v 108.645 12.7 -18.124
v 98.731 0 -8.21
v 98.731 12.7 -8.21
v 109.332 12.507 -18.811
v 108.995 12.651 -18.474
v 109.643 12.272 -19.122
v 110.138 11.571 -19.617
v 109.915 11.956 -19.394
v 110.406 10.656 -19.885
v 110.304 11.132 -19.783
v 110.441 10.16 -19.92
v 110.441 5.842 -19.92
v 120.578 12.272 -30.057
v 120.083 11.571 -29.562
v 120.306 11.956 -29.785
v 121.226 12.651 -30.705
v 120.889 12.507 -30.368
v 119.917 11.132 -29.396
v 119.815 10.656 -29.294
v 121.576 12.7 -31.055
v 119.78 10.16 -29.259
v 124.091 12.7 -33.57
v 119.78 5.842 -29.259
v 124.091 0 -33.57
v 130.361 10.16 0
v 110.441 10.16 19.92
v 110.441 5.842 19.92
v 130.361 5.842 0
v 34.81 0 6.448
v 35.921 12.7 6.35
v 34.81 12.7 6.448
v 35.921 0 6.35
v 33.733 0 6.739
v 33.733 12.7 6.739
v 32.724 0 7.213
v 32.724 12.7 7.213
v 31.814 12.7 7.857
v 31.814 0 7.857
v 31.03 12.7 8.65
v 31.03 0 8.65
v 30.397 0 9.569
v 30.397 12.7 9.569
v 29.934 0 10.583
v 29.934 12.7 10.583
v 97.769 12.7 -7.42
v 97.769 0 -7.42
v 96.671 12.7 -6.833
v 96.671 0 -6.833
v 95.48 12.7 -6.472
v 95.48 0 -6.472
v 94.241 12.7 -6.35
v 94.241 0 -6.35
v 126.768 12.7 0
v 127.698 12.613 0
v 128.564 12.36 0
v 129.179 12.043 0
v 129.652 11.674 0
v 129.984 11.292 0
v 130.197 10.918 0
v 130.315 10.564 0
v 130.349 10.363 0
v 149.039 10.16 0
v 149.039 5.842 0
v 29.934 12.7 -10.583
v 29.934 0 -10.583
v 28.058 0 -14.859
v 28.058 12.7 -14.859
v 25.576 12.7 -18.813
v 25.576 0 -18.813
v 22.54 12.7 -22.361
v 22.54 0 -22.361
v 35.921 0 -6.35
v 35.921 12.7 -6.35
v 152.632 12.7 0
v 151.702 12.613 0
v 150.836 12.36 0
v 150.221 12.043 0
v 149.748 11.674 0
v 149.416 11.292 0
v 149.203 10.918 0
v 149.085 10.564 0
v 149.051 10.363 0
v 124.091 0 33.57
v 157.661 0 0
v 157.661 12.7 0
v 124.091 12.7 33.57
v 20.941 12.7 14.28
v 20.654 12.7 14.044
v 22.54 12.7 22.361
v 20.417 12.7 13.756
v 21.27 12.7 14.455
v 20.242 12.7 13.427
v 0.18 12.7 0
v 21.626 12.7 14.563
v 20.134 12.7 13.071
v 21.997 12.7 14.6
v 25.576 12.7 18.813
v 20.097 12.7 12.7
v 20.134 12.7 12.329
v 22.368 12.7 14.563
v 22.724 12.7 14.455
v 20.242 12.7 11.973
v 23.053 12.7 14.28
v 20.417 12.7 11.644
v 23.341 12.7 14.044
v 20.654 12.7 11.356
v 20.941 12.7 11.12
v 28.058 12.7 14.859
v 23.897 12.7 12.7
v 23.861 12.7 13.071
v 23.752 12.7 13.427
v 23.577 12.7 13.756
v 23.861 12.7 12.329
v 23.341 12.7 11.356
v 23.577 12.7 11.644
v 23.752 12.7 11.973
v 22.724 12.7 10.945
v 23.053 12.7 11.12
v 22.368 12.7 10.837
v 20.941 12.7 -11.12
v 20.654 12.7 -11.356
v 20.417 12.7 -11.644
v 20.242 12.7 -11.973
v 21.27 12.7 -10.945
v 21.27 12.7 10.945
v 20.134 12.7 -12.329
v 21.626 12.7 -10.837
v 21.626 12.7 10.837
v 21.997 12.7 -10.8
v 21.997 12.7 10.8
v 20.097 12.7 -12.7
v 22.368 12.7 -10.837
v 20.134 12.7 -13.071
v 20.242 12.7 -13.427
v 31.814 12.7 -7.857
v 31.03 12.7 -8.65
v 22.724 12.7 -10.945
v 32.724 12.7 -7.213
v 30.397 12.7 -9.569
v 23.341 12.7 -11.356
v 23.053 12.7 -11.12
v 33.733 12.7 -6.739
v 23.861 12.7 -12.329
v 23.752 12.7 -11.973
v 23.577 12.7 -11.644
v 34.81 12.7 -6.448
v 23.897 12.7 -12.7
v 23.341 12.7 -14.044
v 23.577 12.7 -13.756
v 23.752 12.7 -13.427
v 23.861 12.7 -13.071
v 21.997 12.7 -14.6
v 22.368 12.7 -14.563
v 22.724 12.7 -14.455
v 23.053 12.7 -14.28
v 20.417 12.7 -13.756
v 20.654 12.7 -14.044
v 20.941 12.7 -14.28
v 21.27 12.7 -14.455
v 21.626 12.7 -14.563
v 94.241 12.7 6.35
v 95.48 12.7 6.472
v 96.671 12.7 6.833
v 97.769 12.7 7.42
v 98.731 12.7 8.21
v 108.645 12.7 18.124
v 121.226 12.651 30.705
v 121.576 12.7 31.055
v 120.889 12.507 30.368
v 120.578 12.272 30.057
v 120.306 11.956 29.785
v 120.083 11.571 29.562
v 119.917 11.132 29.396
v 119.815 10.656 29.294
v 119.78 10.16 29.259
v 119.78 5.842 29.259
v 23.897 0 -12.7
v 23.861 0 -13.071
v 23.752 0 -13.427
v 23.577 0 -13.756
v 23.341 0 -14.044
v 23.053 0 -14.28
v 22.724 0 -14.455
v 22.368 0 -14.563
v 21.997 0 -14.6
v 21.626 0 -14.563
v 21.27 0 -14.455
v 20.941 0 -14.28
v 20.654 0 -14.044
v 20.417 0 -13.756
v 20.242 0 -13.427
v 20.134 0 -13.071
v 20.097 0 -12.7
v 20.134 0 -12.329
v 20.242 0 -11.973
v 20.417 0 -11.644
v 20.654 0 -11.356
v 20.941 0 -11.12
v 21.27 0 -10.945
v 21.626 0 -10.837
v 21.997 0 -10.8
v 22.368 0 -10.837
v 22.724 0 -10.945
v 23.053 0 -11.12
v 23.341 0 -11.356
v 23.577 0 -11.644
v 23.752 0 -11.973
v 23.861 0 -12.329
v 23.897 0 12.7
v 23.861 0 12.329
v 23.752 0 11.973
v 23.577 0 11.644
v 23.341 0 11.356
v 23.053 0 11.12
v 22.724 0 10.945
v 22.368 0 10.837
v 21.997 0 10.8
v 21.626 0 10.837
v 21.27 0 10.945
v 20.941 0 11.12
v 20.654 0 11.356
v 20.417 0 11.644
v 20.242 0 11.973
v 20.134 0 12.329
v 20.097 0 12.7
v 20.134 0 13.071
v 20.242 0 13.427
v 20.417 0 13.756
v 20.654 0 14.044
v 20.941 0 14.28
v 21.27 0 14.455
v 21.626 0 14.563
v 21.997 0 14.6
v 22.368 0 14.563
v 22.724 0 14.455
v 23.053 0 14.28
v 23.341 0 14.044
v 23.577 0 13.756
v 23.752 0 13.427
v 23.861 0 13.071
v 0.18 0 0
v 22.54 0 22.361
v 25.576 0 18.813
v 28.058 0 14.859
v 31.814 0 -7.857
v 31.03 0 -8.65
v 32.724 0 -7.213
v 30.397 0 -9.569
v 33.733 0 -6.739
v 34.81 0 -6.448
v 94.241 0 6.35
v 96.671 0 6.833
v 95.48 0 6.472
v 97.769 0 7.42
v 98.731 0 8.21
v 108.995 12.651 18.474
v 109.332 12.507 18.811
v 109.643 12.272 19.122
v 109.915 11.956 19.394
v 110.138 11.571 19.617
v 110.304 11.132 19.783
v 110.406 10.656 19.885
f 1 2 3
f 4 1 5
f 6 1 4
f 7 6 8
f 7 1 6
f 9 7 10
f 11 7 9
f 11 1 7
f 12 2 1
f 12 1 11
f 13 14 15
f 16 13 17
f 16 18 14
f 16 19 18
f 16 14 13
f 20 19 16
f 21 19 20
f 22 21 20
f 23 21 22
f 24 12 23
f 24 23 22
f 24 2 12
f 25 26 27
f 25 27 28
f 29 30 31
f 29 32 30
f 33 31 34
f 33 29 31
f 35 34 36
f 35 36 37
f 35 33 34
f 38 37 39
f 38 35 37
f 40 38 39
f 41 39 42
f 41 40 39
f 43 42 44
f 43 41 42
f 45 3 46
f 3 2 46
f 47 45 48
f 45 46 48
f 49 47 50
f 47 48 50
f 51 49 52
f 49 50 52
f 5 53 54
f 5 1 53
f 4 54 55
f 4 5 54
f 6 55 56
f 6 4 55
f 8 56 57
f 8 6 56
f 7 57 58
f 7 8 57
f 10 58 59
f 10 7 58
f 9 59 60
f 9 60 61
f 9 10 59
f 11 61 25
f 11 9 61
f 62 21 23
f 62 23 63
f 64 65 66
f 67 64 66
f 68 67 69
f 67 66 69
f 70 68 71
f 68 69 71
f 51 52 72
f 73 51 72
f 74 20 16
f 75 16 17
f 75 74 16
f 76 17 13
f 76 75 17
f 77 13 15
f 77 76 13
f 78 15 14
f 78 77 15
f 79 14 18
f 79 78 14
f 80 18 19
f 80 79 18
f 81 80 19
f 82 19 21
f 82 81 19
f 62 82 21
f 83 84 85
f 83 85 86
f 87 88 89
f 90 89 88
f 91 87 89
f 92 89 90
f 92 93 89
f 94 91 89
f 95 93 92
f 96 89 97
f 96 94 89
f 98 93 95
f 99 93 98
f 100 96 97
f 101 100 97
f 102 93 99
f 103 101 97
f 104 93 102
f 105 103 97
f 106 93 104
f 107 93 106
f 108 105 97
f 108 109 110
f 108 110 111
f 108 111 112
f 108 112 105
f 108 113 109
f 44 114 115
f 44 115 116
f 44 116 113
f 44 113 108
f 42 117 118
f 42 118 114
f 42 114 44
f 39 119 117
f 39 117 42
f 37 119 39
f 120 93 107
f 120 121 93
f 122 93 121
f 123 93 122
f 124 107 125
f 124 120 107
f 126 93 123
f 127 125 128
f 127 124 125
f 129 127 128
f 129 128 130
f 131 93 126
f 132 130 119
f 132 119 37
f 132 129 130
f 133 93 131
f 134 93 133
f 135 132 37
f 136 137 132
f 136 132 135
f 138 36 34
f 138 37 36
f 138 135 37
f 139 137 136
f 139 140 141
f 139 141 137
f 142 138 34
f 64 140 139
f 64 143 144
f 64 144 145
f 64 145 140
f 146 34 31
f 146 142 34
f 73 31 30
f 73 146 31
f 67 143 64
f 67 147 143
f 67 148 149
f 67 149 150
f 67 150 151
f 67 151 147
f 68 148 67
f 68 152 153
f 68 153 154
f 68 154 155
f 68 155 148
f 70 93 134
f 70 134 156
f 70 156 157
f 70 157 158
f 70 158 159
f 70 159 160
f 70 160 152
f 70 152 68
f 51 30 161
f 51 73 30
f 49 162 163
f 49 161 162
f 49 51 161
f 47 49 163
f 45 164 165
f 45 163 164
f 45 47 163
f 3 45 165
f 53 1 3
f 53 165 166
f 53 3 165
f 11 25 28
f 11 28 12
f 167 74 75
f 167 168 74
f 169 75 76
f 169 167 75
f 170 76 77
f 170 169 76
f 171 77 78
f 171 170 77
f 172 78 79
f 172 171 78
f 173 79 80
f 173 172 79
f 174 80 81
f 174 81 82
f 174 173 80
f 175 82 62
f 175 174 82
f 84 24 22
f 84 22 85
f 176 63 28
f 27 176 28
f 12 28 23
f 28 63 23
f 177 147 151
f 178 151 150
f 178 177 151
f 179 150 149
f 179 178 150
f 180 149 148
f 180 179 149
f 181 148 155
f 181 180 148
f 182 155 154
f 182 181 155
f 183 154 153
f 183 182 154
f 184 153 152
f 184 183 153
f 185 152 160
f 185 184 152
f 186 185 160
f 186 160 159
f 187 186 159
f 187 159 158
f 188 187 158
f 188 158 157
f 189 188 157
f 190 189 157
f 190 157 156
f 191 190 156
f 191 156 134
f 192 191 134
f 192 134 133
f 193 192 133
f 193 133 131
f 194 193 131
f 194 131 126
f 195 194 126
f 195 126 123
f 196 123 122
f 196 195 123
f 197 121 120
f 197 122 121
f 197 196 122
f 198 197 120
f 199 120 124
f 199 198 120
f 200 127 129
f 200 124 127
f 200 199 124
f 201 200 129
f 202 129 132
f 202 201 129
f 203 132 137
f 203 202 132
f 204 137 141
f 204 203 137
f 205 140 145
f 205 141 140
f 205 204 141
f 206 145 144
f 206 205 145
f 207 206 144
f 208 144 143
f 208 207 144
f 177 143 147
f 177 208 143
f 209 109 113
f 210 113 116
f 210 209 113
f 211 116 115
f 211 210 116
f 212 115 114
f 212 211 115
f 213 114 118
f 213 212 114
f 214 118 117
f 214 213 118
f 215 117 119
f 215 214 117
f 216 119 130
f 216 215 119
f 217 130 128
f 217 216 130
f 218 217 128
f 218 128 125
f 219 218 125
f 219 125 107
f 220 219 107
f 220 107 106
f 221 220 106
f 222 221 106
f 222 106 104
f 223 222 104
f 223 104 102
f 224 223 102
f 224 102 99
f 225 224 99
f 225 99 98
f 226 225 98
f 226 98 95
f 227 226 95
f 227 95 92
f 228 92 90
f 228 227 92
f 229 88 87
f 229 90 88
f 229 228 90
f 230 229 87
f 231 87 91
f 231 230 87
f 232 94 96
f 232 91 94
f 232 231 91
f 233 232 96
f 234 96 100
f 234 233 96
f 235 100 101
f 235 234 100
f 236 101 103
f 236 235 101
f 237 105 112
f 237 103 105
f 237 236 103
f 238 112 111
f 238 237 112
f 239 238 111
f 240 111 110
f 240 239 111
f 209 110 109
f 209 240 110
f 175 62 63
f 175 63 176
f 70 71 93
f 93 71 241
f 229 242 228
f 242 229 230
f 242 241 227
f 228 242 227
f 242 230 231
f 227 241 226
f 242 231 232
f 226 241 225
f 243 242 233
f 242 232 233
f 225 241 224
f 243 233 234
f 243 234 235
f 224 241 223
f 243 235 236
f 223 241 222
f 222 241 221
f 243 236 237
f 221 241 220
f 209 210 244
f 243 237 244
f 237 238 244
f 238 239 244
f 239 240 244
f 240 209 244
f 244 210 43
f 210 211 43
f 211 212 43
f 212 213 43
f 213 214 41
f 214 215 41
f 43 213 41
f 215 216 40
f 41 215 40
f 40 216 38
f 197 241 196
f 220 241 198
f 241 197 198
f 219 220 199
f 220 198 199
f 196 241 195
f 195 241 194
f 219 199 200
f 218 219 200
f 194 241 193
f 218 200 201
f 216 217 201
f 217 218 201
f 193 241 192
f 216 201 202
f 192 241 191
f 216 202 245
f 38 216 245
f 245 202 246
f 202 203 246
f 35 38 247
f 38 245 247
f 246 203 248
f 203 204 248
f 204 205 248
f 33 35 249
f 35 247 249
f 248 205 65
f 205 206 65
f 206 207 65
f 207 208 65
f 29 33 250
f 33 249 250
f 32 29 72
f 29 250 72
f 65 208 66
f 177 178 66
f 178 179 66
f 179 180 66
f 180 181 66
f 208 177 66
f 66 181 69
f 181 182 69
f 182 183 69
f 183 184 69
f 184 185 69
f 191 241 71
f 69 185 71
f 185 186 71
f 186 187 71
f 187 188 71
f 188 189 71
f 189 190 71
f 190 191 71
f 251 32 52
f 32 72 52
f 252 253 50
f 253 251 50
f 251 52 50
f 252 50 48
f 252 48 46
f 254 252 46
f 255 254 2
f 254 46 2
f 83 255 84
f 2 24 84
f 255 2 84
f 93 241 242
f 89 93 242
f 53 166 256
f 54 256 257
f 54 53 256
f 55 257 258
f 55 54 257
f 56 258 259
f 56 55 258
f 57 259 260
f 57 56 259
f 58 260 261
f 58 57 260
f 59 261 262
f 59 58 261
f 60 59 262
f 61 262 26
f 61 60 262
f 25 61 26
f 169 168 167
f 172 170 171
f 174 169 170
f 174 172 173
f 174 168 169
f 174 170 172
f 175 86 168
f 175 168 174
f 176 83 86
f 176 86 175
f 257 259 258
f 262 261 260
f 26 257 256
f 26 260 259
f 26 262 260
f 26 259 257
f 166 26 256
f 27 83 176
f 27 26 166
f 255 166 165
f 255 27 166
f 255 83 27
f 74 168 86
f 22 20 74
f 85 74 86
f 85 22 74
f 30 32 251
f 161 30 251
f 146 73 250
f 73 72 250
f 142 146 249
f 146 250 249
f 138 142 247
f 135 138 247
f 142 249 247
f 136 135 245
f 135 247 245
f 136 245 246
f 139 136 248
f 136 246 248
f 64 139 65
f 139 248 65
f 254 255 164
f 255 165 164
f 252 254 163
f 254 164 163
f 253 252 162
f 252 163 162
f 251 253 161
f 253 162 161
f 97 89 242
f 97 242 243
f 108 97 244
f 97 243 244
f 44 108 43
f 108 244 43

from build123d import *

# Parameters (mm, degrees)
BOSS_EXTRUDE11_DEPTH = 12.7
BOSS_EXTRUDE12_DEPTH = 12.7
BOSS_EXTRUDE13_DEPTH = 12.7
CUT_EXTRUDE1_START   = 12.7
CUT_EXTRUDE1_DEPTH   = 6.858
SKETCH25_R           = 1.90000001
CUT_EXTRUDE2_DEPTH   = 13.7
FILLET1_R            = 2.54
FILLET2_R            = 6.35


with BuildPart() as part:
    # Sketch12 → Boss-Extrude11 (new body)
    with BuildSketch(Plane(origin=(0, 0, 0), x_dir=(1, 0, 0), z_dir=(0, 1, 0))):
        Polygon((139.879605122, 6.35), (6.529605122, 6.35), (0.179605122, 0), (6.529605122, -6.35), (139.879605122, -6.35), align=None)
    extrude(amount=BOSS_EXTRUDE11_DEPTH)

    # Sketch23 → Boss-Extrude12 (add)
    with BuildSketch(Plane(origin=(0, 0, 0), x_dir=(1, 0, 0), z_dir=(0, 1, 0))):
        Polygon((90.5209817, 0), (124.090746971, 33.569765271), (157.660512242, 0), (124.090746971, -33.569765271), align=None)
    extrude(amount=BOSS_EXTRUDE12_DEPTH)

    # Sketch26 → Boss-Extrude13 (add)
    with BuildSketch(Plane(origin=(0, 0, 0), x_dir=(1, 0, 0), z_dir=(0, 1, 0))):
        with BuildLine():
            Line((22.540263258, 22.360658136), (0.179605122, 0))
            Line((0.179605122, 0), (22.540263258, -22.360658136))
            ThreePointArc((22.540263258, -22.360658136), (31.75, 0), (22.540263258, 22.360658136))
        make_face()
    extrude(amount=BOSS_EXTRUDE13_DEPTH)

    # Sketch24 → Cut-Extrude1 (cut)
    with BuildSketch(Plane(origin=(0, 0, 0), x_dir=(1, 0, 0), z_dir=(0, 1, 0)).offset(CUT_EXTRUDE1_START)):
        Polygon((119.780224033, 29.259242333), (149.039466366, 0), (119.780224033, -29.259242333), (110.440757667, -19.919775967), (130.360533634, 0), (110.440757667, 19.919775967), align=None)
    extrude(amount=-CUT_EXTRUDE1_DEPTH, mode=Mode.SUBTRACT)

    # Sketch25 → Cut-Extrude2 (cut, through all)
    with BuildSketch(Plane(origin=(0, 0, 0), x_dir=(1, 0, 0), z_dir=(0, 1, 0))):
        with Locations((21.997045256, 12.7)):
            Circle(SKETCH25_R)
        with Locations((21.997045256, -12.7)):
            Circle(SKETCH25_R)
    extrude(amount=CUT_EXTRUDE2_DEPTH, mode=Mode.SUBTRACT)

    # Fillet1
    fillet1_edges = [part.edges().sort_by_distance(p)[0] for p in [
        (120.400645651, 12.7, 9.959887983),
        (120.400645651, 12.7, -9.959887983),
        (134.4098452, 12.7, -14.629621166),
        (134.4098452, 12.7, 14.629621166),
    ]]
    fillet(fillet1_edges, radius=FILLET1_R)

    # Fillet2
    fillet2_edges = [part.edges().sort_by_distance(p)[0] for p in [
        (96.8709817, 6.35, 6.35),
        (96.8709817, 6.35, -6.35),
        (31.108519733, 6.35, -6.35),
        (31.108519733, 6.35, 6.35),
    ]]
    fillet(fillet2_edges, radius=FILLET2_R)


solid = part.part
